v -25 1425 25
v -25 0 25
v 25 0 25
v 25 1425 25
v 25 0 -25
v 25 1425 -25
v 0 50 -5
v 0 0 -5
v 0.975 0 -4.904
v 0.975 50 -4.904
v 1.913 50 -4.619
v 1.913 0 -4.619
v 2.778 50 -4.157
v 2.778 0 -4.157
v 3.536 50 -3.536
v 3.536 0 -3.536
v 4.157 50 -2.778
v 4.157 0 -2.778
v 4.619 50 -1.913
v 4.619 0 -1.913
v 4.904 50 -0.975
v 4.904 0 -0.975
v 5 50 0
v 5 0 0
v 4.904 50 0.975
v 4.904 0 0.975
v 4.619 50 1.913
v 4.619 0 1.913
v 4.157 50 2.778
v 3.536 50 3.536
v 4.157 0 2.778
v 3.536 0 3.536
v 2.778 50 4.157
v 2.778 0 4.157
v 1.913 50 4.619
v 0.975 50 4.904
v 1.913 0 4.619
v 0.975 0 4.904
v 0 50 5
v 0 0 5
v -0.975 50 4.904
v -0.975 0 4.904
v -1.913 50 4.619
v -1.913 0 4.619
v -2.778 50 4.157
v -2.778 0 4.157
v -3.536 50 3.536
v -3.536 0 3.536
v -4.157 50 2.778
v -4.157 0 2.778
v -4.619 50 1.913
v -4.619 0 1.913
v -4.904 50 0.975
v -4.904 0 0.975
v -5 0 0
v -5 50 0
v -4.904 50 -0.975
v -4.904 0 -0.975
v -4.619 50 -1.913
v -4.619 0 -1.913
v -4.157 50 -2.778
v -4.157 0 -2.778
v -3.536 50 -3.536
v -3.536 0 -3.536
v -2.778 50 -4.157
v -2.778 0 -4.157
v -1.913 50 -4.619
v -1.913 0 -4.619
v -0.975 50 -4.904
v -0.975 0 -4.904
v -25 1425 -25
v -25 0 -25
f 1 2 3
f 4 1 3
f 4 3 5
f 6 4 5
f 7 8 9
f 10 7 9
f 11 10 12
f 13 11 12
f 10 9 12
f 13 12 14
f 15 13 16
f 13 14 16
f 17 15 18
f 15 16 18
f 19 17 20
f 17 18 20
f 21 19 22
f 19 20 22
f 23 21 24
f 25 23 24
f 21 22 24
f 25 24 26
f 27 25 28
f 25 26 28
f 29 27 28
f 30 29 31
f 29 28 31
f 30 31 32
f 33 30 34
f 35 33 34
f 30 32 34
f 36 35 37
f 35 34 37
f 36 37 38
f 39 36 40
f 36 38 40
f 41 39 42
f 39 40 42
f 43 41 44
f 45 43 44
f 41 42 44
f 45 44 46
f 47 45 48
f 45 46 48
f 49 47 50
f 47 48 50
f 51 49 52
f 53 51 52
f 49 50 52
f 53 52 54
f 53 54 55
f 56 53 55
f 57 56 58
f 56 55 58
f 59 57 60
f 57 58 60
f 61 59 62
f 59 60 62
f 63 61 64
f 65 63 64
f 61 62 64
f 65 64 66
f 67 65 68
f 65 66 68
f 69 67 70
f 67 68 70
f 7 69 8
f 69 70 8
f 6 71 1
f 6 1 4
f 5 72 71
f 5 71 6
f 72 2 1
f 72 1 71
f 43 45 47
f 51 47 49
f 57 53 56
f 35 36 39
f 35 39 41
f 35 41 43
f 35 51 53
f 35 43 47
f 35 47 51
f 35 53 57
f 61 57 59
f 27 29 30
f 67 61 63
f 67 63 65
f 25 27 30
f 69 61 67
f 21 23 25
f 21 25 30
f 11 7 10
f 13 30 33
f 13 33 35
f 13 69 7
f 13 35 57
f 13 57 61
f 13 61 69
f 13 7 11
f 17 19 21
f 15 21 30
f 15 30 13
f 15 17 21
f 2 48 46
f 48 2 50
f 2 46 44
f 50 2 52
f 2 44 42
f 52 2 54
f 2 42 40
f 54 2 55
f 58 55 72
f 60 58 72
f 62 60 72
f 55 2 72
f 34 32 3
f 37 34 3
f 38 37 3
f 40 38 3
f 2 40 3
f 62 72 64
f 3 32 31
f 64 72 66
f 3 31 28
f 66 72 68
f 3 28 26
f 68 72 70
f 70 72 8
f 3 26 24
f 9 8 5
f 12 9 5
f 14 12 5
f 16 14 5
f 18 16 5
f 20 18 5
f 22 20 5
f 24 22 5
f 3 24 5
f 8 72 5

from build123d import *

# Parameters (mm, degrees)
SKETCH_1_W          = 50
SKETCH_1_H          = 50
EXTRUDE_1_DEPTH     = 1425
SKETCH_2_R          = 5
CUT_EXTRUDE_1_DEPTH = 50


with BuildPart() as part:
    # Эскиз1 → Бобышка-Вытянуть1 (new body)
    with BuildSketch(Plane(origin=(0, 0, 0), x_dir=(1, 0, 0), z_dir=(0, 1, 0))):
        Rectangle(SKETCH_1_W, SKETCH_1_H)
    extrude(amount=EXTRUDE_1_DEPTH)

    # Эскиз2 → Вырез-Вытянуть1 (cut)
    with BuildSketch(Plane.XZ):
        with Locations(Location((0, 0, 0), (0, 0, 270))):
            Circle(SKETCH_2_R)
    extrude(amount=-CUT_EXTRUDE_1_DEPTH, mode=Mode.SUBTRACT)


solid = part.part
